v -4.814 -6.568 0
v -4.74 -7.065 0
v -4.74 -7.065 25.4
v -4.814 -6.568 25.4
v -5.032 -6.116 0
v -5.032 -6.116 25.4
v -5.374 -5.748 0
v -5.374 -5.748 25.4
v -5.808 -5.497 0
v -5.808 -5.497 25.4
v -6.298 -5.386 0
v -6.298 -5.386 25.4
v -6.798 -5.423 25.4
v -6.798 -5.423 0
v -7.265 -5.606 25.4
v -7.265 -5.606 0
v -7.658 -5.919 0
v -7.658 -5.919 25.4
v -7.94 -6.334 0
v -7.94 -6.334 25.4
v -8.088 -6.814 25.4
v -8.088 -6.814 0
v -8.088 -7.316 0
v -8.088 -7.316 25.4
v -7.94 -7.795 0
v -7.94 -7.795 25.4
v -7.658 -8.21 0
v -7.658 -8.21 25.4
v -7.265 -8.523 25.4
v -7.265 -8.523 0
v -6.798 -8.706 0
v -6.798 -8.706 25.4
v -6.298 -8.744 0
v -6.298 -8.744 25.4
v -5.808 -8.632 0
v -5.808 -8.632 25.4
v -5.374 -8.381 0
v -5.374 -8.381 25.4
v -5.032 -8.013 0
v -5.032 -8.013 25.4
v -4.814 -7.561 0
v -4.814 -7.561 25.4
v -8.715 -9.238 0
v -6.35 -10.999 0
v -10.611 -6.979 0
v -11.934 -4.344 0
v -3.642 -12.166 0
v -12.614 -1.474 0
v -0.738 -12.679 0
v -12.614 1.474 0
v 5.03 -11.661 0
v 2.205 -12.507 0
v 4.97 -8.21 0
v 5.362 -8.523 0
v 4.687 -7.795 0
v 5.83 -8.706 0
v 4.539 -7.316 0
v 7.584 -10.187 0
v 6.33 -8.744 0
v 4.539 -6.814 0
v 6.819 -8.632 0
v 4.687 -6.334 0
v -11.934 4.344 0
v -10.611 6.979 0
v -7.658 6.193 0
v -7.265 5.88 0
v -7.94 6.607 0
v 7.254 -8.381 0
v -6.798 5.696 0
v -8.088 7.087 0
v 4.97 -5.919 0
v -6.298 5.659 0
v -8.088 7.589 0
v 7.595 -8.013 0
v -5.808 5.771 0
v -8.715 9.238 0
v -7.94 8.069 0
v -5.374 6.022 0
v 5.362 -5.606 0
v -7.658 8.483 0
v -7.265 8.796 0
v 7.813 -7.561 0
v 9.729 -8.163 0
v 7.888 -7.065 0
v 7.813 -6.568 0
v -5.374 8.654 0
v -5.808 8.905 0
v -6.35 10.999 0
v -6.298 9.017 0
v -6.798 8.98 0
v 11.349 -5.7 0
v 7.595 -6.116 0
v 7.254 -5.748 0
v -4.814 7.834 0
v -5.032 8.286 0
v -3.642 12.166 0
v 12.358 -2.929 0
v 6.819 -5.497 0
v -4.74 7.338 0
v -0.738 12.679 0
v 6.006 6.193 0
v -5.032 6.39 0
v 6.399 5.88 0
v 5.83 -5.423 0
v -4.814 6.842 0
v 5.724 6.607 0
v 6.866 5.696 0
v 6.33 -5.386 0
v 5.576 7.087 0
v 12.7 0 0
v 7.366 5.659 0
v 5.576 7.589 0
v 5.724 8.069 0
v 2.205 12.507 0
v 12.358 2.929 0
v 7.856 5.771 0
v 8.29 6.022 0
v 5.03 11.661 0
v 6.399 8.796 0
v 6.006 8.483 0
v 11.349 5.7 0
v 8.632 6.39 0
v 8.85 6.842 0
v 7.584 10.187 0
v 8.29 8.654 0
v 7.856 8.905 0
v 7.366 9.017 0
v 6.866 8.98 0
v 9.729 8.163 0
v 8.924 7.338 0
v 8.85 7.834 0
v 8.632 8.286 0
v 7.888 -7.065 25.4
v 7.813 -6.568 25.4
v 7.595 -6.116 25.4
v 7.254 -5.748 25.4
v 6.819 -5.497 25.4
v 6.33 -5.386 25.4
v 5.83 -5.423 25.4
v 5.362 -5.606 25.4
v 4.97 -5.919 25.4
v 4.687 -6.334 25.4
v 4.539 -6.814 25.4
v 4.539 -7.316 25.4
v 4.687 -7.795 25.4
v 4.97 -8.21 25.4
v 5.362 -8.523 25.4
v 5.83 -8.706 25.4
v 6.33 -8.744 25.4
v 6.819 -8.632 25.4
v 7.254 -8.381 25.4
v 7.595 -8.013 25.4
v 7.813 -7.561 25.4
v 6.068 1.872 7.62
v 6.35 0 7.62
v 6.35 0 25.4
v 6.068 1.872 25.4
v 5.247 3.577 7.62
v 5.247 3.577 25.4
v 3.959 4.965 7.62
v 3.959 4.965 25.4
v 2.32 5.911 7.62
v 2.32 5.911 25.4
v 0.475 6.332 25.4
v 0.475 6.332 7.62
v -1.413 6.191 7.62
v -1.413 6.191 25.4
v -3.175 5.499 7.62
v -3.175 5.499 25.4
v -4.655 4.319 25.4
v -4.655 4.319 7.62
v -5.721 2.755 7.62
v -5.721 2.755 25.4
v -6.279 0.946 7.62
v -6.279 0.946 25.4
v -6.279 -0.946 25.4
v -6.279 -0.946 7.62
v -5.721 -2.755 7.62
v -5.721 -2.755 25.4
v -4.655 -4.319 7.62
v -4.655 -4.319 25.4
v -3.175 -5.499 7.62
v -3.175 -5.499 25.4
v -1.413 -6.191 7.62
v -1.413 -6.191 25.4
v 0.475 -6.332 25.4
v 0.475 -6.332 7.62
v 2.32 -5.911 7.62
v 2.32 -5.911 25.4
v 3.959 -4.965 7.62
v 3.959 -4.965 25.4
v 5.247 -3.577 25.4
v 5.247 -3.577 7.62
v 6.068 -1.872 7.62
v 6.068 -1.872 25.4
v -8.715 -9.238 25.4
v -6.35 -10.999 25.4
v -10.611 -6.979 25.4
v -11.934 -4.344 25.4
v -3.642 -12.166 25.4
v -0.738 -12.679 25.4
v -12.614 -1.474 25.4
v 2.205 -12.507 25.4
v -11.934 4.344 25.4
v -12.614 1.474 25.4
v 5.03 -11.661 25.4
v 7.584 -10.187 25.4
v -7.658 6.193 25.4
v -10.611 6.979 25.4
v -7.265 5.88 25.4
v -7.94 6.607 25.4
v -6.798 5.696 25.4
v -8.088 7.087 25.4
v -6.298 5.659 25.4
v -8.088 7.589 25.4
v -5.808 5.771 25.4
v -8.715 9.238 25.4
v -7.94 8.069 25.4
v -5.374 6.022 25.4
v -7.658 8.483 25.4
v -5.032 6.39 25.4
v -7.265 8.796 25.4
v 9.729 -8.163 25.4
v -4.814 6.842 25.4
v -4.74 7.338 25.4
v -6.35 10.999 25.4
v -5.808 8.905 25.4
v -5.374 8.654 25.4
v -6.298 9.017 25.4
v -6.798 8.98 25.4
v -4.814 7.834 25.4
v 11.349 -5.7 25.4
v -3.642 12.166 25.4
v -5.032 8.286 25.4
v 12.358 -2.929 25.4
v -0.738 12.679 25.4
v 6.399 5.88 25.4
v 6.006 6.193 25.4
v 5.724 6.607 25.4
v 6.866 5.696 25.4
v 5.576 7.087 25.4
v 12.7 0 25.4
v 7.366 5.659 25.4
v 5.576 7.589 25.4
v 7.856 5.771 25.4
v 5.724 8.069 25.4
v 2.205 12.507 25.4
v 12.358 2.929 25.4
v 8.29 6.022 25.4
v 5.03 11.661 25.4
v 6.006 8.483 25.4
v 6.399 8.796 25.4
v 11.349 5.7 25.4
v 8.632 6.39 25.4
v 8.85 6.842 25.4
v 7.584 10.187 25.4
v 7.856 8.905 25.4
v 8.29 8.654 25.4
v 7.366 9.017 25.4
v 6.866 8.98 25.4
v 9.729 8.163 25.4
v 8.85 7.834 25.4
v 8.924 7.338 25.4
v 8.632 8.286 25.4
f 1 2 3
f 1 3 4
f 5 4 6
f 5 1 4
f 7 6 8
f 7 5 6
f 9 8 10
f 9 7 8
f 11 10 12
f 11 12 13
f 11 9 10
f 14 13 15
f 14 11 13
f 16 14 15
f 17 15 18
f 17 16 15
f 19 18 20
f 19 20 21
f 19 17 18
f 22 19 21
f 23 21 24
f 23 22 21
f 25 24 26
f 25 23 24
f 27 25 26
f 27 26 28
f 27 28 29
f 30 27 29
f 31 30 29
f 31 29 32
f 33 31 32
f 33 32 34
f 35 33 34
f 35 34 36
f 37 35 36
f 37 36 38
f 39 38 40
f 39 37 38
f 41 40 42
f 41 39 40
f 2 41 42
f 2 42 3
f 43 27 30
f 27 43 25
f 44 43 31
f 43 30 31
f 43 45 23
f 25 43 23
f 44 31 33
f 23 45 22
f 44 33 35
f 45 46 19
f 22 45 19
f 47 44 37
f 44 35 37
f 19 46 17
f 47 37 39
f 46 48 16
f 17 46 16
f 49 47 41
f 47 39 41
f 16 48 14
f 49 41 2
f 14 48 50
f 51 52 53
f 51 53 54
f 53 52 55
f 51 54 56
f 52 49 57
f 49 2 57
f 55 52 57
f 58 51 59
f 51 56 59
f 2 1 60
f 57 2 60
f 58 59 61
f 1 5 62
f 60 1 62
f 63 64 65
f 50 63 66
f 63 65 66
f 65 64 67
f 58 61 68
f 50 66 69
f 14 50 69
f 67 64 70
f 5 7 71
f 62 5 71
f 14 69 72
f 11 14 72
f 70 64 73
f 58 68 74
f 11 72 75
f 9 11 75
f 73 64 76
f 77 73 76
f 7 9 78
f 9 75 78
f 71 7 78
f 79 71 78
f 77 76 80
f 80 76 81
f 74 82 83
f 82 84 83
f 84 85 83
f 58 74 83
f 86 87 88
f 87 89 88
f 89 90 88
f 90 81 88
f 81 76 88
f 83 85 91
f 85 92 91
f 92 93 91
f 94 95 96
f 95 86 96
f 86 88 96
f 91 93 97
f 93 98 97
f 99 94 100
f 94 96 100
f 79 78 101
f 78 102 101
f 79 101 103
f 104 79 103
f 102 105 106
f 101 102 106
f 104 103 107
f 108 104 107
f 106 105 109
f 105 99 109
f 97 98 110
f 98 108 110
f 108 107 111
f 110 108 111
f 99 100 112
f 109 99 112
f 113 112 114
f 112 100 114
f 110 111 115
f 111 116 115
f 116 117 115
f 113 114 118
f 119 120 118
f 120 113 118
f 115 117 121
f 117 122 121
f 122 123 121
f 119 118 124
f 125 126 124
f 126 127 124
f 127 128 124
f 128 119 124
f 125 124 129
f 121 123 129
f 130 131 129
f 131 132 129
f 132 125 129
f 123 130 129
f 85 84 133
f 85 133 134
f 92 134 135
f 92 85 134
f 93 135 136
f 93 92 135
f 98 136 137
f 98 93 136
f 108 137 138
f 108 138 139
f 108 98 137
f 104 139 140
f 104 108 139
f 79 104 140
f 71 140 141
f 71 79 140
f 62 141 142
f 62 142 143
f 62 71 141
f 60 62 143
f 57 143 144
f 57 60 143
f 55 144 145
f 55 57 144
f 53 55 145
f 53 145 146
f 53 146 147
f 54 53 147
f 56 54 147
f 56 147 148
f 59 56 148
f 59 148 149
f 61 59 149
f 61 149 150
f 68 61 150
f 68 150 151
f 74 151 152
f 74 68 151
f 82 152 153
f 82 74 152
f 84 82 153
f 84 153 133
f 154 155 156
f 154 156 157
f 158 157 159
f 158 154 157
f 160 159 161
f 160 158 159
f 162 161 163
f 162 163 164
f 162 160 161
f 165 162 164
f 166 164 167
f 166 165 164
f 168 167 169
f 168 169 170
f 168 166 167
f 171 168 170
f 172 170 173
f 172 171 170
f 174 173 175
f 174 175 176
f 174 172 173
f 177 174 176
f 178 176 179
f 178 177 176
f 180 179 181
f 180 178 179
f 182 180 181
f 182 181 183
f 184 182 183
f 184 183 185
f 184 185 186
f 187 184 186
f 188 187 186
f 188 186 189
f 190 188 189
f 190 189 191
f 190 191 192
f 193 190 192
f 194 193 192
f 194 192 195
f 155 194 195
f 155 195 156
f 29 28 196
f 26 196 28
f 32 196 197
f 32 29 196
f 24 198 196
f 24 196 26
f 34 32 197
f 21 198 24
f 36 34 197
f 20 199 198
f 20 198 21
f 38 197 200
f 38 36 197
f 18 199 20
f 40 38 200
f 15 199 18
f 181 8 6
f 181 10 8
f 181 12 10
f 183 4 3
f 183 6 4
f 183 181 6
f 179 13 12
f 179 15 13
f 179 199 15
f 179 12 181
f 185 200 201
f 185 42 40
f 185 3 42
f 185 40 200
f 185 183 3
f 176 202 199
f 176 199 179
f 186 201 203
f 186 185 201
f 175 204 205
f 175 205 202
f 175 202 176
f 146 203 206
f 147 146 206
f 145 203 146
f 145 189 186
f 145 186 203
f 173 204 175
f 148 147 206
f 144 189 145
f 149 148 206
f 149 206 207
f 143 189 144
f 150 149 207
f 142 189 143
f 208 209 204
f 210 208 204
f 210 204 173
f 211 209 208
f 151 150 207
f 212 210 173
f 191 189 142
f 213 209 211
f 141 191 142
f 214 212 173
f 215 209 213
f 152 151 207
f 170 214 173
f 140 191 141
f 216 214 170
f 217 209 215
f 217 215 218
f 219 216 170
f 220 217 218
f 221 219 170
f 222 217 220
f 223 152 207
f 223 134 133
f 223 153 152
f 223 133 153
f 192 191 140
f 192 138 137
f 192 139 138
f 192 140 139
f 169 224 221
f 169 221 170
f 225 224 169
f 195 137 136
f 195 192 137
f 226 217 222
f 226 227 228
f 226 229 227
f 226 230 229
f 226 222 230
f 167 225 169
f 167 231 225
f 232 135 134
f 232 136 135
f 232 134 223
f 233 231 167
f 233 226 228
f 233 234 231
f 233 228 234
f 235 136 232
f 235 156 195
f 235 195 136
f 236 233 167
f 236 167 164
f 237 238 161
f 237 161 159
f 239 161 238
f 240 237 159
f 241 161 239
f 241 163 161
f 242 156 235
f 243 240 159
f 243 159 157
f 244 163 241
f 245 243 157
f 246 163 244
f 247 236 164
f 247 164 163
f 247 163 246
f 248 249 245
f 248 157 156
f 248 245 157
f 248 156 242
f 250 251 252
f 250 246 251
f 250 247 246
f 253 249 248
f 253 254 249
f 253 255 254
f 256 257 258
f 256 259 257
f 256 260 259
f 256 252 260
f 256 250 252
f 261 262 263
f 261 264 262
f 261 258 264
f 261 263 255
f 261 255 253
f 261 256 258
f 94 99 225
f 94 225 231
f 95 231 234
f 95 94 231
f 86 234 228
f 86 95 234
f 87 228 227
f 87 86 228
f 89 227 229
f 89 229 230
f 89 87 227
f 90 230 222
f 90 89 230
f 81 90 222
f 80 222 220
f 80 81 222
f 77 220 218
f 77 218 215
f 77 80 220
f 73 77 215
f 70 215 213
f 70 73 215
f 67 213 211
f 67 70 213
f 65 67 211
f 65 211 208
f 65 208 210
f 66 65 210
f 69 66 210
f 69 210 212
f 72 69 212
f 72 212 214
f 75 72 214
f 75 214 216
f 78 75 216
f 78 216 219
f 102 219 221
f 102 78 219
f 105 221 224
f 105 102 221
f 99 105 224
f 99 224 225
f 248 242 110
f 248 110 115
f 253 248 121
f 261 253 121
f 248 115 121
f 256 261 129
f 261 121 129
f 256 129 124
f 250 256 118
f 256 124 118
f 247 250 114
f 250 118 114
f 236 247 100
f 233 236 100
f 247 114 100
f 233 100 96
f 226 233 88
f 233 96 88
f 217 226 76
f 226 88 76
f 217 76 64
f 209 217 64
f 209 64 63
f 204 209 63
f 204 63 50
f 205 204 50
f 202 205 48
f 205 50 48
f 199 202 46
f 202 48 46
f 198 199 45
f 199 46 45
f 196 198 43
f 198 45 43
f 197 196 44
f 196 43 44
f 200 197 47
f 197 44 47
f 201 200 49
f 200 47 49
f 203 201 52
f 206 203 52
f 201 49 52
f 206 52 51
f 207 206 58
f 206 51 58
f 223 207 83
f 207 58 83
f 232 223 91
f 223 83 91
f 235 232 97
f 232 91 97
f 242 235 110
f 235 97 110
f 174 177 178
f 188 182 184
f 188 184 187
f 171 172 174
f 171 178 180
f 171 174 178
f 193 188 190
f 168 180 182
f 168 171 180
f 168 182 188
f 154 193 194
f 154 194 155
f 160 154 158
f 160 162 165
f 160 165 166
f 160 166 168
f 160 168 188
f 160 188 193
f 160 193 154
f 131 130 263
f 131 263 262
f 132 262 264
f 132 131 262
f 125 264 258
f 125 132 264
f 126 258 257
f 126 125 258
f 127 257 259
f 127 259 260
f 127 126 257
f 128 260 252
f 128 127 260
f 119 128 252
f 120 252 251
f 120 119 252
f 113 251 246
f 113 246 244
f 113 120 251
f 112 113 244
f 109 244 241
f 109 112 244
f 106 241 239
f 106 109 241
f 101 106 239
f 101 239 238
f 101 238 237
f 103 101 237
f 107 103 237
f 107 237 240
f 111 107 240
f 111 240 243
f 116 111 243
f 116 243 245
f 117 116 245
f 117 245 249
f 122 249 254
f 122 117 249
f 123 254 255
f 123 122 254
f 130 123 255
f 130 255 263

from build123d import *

# Parameters (mm, degrees)
F0_R     = 12.7
F0_R_2   = 1.68372
F0_R_3   = 6.35
F1_DEPTH = 25.4
F0_R_4   = 4.0005
F2_DEPTH = 7.62
F3_DEPTH = 7.62


with BuildPart() as f1:
    # F0 (on Top) → F1 (new body)
    with BuildSketch(Plane.XY):
        Circle(F0_R)
        with Locations((-6.423387, -7.064583)):
            Circle(F0_R_2, mode=Mode.SUBTRACT)
        with Locations((6.204293, -7.064583)):
            Circle(F0_R_2, mode=Mode.SUBTRACT)
        Circle(F0_R_3, mode=Mode.SUBTRACT)
        with Locations((-6.423387, 7.338002)):
            Circle(F0_R_2, mode=Mode.SUBTRACT)
        with Locations((7.240649, 7.338002)):
            Circle(F0_R_2, mode=Mode.SUBTRACT)
    extrude(amount=F1_DEPTH)

    # F0 (on Top) → F2 (join)
    with BuildSketch(Plane.XY):
        Circle(F0_R_3)
        Circle(F0_R_4, mode=Mode.SUBTRACT)
    extrude(amount=F2_DEPTH)

    # F0 (on Top) → F3 (join)
    with BuildSketch(Plane.XY):
        Circle(F0_R_4)
    extrude(amount=F3_DEPTH)


solid = f1.part
